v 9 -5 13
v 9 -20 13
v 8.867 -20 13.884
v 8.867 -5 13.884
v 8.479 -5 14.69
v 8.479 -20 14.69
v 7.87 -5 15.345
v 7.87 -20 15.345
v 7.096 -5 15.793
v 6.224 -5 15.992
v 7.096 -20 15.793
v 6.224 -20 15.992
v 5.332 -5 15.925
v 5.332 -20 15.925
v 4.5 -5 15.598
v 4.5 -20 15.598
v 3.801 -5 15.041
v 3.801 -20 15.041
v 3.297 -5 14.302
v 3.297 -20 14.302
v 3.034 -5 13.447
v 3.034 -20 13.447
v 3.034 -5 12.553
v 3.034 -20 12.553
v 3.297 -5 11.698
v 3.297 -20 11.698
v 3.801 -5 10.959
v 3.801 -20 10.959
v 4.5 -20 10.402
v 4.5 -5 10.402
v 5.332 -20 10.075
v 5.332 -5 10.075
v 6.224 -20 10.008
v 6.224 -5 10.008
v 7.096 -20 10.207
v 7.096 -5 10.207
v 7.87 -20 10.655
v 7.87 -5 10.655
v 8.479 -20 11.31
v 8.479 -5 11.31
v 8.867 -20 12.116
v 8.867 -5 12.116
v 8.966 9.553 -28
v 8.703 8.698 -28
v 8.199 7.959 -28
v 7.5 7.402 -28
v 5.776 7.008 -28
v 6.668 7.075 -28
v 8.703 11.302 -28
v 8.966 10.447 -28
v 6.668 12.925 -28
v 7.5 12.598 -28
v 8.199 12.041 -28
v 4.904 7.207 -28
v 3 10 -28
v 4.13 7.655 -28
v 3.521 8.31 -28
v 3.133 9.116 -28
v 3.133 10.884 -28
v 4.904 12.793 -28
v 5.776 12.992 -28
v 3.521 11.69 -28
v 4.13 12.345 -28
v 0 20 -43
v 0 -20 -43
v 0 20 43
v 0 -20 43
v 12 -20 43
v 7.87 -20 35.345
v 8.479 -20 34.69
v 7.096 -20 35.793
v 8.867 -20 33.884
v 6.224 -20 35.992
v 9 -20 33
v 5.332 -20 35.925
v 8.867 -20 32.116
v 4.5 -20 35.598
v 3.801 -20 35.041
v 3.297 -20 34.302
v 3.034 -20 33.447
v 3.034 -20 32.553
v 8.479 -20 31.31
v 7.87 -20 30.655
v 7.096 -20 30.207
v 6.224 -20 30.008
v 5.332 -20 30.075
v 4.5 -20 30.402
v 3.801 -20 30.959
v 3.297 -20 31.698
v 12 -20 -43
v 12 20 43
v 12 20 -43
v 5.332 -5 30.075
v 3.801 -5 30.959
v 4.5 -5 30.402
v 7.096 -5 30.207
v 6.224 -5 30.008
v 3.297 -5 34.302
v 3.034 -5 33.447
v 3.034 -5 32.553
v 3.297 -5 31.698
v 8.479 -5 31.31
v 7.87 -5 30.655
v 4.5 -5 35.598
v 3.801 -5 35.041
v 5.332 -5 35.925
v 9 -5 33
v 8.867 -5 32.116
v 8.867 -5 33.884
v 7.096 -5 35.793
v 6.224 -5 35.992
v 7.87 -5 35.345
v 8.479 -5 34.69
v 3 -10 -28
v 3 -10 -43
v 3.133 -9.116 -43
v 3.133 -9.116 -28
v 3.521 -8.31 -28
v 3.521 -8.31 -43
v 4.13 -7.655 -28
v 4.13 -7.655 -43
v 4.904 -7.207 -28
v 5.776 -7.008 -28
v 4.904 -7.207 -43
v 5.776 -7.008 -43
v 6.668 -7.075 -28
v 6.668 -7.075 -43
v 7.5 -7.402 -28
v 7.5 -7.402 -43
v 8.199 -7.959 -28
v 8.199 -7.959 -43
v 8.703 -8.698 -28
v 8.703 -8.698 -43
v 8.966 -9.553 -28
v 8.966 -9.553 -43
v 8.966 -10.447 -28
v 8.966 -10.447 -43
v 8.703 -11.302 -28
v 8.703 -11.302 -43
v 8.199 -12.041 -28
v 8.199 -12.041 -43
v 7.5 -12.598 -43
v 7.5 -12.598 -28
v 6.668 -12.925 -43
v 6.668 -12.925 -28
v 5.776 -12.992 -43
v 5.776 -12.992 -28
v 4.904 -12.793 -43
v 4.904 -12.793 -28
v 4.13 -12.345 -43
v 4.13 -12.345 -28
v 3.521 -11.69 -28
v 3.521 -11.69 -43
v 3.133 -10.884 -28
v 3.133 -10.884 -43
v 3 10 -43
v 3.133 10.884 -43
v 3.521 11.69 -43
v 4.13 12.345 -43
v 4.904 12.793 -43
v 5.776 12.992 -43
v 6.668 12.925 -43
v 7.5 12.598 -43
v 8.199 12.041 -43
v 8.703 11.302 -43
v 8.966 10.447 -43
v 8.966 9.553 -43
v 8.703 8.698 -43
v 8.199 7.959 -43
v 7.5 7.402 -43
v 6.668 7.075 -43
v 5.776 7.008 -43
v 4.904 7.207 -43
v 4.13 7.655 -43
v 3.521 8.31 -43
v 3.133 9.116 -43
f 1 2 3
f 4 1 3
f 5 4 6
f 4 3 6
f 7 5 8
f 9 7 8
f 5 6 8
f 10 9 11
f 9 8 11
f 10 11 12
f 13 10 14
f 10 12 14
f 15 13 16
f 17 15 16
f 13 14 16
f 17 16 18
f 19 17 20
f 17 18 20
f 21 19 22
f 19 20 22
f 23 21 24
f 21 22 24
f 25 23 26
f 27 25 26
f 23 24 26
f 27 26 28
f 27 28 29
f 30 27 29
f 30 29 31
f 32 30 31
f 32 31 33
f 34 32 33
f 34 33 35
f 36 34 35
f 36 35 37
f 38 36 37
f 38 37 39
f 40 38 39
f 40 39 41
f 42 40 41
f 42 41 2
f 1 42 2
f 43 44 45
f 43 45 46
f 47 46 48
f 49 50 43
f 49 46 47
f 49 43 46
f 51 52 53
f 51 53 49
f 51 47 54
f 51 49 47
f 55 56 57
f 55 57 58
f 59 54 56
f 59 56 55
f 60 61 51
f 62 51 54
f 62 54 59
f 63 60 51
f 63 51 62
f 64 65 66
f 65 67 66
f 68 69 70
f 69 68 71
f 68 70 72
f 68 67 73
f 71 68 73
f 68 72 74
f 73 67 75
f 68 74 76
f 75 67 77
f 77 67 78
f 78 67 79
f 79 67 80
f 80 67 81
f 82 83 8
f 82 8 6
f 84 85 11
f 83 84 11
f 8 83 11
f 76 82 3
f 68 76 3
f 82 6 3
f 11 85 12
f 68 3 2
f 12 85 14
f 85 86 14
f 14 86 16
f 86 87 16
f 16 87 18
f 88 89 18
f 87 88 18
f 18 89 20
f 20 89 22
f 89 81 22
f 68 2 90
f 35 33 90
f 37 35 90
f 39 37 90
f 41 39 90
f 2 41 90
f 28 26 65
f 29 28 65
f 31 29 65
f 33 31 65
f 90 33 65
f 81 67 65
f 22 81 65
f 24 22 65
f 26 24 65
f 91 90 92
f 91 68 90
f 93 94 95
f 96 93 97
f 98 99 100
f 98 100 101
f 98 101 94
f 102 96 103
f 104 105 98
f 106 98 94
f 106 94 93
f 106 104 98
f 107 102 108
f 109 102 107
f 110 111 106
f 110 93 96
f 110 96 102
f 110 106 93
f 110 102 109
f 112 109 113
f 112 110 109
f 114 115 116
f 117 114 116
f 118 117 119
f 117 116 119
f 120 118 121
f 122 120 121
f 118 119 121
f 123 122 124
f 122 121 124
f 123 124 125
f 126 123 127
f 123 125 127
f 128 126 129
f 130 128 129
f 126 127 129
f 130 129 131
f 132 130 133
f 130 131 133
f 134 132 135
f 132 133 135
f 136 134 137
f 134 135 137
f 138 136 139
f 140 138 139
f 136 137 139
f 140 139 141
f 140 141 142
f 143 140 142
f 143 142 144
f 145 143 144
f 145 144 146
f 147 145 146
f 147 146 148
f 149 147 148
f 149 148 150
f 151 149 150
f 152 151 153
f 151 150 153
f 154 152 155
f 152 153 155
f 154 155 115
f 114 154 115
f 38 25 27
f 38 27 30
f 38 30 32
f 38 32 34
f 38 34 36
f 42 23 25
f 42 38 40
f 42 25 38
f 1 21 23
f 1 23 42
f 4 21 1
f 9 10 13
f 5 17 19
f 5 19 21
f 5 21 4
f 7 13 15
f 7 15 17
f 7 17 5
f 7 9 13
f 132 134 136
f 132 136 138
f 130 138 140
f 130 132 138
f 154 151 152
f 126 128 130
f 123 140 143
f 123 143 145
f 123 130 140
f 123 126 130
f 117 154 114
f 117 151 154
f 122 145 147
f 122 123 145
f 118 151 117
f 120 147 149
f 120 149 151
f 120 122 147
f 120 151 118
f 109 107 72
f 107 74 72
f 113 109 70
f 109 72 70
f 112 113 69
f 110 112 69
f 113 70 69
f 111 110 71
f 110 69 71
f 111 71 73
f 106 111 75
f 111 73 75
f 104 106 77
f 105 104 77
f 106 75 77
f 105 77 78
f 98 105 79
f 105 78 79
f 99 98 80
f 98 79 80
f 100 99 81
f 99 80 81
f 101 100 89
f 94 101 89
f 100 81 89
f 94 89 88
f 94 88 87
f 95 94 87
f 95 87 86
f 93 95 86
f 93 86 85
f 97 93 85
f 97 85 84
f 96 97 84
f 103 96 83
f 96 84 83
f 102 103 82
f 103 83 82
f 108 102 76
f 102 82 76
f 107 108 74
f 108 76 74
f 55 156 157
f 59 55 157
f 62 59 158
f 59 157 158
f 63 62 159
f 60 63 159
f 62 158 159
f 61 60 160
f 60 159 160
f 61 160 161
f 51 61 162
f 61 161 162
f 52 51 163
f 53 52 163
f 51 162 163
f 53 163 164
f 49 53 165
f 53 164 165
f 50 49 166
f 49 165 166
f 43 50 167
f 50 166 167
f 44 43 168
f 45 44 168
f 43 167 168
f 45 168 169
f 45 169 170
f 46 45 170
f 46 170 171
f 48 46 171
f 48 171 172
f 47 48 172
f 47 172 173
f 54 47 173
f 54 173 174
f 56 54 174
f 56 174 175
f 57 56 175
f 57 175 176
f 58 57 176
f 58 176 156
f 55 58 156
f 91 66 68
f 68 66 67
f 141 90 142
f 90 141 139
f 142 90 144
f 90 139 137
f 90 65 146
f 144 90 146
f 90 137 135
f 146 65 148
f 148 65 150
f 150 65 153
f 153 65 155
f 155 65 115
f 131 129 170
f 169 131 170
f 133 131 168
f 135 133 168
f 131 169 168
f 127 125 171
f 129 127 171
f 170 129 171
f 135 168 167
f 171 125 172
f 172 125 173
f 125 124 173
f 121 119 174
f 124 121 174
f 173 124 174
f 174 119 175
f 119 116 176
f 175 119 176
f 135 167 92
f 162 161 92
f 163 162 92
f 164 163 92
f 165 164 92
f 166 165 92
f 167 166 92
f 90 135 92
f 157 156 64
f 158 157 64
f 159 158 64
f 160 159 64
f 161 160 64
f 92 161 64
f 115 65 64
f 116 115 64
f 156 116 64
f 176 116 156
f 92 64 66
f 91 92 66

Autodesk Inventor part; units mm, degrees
ref_plane "YZ Plane" through (0, 0, 0) normal (1, 0, 0) x (0, 1, 0)
ref_plane "XZ Plane" through (0, 0, 0) normal (0, 1, 0) x (-1, 0, 0)
ref_plane "XY Plane" through (0, 0, 0) normal (0, 0, 1) x (1, 0, 0)
sketch "Sketch1" plane through (0, 0, 0) normal (1, 0, 0) x (0, 1, 0)
  line L0 (20, 43) -> (-20, 43)
  line L1 (-20, 43) -> (-20, -43)
  line L2 (-20, -43) -> (20, -43)
  line L3 (20, -43) -> (20, 43)
  line L4 (20, 43) -> (-20, -43) construction
  line L5 (-20, 43) -> (20, -43) construction
  point P0 (0, 0)
  dimension "d0" = 40
  dimension "d1" = 86
extrude "Extrusion1" add sketch "Sketch1" along normal blind 12
sketch "Sketch2" plane through (0, -20, -43) normal (0, -1, 0) x (1, 0, 0)
  circle A0 centre (6, 56) radius 3
  circle A1 centre (6, 76) radius 3
  line L0 (0, 86) -> (12, 86) projected
  line L1 (6, 86) -> (6, 56) construction
  point P0 (0, 43)
  dimension "d4" = 6
  dimension "d6" = 10
  dimension "d7" = 20
extrude "Extrusion2" cut sketch "Sketch2" against normal blind 15
sketch "Sketch3" plane through (0, -20, -43) normal (0, 0, -1) x (-1, 0, 0)
  line L0 (0, 40) -> (-12, 40) projected
  line L1 (-6, 40) -> (-6, 0) construction
  line L2 (0, 0) -> (-12, 0) projected
  circle A0 centre (-6, 30) radius 3
  circle A1 centre (-6, 10) radius 3
  point P0 (0, 20)
  dimension "d10" = 6
  dimension "d11" = 10
  dimension "d12" = 20
extrude "Extrusion3" cut sketch "Sketch3" against normal blind 15
thread "Thread1" size "M6x1" class "6H" standard "ANSI Metric M Profile" full length
thread "Thread2" size "M6x1" class "6H" standard "ANSI Metric M Profile" full length
thread "Thread3" size "M6x1" class "6H" standard "ANSI Metric M Profile" full length
thread "Thread4" size "M6x1" class "6H" standard "ANSI Metric M Profile" full length
properties part number "MotorHolderLongAxisTop"
